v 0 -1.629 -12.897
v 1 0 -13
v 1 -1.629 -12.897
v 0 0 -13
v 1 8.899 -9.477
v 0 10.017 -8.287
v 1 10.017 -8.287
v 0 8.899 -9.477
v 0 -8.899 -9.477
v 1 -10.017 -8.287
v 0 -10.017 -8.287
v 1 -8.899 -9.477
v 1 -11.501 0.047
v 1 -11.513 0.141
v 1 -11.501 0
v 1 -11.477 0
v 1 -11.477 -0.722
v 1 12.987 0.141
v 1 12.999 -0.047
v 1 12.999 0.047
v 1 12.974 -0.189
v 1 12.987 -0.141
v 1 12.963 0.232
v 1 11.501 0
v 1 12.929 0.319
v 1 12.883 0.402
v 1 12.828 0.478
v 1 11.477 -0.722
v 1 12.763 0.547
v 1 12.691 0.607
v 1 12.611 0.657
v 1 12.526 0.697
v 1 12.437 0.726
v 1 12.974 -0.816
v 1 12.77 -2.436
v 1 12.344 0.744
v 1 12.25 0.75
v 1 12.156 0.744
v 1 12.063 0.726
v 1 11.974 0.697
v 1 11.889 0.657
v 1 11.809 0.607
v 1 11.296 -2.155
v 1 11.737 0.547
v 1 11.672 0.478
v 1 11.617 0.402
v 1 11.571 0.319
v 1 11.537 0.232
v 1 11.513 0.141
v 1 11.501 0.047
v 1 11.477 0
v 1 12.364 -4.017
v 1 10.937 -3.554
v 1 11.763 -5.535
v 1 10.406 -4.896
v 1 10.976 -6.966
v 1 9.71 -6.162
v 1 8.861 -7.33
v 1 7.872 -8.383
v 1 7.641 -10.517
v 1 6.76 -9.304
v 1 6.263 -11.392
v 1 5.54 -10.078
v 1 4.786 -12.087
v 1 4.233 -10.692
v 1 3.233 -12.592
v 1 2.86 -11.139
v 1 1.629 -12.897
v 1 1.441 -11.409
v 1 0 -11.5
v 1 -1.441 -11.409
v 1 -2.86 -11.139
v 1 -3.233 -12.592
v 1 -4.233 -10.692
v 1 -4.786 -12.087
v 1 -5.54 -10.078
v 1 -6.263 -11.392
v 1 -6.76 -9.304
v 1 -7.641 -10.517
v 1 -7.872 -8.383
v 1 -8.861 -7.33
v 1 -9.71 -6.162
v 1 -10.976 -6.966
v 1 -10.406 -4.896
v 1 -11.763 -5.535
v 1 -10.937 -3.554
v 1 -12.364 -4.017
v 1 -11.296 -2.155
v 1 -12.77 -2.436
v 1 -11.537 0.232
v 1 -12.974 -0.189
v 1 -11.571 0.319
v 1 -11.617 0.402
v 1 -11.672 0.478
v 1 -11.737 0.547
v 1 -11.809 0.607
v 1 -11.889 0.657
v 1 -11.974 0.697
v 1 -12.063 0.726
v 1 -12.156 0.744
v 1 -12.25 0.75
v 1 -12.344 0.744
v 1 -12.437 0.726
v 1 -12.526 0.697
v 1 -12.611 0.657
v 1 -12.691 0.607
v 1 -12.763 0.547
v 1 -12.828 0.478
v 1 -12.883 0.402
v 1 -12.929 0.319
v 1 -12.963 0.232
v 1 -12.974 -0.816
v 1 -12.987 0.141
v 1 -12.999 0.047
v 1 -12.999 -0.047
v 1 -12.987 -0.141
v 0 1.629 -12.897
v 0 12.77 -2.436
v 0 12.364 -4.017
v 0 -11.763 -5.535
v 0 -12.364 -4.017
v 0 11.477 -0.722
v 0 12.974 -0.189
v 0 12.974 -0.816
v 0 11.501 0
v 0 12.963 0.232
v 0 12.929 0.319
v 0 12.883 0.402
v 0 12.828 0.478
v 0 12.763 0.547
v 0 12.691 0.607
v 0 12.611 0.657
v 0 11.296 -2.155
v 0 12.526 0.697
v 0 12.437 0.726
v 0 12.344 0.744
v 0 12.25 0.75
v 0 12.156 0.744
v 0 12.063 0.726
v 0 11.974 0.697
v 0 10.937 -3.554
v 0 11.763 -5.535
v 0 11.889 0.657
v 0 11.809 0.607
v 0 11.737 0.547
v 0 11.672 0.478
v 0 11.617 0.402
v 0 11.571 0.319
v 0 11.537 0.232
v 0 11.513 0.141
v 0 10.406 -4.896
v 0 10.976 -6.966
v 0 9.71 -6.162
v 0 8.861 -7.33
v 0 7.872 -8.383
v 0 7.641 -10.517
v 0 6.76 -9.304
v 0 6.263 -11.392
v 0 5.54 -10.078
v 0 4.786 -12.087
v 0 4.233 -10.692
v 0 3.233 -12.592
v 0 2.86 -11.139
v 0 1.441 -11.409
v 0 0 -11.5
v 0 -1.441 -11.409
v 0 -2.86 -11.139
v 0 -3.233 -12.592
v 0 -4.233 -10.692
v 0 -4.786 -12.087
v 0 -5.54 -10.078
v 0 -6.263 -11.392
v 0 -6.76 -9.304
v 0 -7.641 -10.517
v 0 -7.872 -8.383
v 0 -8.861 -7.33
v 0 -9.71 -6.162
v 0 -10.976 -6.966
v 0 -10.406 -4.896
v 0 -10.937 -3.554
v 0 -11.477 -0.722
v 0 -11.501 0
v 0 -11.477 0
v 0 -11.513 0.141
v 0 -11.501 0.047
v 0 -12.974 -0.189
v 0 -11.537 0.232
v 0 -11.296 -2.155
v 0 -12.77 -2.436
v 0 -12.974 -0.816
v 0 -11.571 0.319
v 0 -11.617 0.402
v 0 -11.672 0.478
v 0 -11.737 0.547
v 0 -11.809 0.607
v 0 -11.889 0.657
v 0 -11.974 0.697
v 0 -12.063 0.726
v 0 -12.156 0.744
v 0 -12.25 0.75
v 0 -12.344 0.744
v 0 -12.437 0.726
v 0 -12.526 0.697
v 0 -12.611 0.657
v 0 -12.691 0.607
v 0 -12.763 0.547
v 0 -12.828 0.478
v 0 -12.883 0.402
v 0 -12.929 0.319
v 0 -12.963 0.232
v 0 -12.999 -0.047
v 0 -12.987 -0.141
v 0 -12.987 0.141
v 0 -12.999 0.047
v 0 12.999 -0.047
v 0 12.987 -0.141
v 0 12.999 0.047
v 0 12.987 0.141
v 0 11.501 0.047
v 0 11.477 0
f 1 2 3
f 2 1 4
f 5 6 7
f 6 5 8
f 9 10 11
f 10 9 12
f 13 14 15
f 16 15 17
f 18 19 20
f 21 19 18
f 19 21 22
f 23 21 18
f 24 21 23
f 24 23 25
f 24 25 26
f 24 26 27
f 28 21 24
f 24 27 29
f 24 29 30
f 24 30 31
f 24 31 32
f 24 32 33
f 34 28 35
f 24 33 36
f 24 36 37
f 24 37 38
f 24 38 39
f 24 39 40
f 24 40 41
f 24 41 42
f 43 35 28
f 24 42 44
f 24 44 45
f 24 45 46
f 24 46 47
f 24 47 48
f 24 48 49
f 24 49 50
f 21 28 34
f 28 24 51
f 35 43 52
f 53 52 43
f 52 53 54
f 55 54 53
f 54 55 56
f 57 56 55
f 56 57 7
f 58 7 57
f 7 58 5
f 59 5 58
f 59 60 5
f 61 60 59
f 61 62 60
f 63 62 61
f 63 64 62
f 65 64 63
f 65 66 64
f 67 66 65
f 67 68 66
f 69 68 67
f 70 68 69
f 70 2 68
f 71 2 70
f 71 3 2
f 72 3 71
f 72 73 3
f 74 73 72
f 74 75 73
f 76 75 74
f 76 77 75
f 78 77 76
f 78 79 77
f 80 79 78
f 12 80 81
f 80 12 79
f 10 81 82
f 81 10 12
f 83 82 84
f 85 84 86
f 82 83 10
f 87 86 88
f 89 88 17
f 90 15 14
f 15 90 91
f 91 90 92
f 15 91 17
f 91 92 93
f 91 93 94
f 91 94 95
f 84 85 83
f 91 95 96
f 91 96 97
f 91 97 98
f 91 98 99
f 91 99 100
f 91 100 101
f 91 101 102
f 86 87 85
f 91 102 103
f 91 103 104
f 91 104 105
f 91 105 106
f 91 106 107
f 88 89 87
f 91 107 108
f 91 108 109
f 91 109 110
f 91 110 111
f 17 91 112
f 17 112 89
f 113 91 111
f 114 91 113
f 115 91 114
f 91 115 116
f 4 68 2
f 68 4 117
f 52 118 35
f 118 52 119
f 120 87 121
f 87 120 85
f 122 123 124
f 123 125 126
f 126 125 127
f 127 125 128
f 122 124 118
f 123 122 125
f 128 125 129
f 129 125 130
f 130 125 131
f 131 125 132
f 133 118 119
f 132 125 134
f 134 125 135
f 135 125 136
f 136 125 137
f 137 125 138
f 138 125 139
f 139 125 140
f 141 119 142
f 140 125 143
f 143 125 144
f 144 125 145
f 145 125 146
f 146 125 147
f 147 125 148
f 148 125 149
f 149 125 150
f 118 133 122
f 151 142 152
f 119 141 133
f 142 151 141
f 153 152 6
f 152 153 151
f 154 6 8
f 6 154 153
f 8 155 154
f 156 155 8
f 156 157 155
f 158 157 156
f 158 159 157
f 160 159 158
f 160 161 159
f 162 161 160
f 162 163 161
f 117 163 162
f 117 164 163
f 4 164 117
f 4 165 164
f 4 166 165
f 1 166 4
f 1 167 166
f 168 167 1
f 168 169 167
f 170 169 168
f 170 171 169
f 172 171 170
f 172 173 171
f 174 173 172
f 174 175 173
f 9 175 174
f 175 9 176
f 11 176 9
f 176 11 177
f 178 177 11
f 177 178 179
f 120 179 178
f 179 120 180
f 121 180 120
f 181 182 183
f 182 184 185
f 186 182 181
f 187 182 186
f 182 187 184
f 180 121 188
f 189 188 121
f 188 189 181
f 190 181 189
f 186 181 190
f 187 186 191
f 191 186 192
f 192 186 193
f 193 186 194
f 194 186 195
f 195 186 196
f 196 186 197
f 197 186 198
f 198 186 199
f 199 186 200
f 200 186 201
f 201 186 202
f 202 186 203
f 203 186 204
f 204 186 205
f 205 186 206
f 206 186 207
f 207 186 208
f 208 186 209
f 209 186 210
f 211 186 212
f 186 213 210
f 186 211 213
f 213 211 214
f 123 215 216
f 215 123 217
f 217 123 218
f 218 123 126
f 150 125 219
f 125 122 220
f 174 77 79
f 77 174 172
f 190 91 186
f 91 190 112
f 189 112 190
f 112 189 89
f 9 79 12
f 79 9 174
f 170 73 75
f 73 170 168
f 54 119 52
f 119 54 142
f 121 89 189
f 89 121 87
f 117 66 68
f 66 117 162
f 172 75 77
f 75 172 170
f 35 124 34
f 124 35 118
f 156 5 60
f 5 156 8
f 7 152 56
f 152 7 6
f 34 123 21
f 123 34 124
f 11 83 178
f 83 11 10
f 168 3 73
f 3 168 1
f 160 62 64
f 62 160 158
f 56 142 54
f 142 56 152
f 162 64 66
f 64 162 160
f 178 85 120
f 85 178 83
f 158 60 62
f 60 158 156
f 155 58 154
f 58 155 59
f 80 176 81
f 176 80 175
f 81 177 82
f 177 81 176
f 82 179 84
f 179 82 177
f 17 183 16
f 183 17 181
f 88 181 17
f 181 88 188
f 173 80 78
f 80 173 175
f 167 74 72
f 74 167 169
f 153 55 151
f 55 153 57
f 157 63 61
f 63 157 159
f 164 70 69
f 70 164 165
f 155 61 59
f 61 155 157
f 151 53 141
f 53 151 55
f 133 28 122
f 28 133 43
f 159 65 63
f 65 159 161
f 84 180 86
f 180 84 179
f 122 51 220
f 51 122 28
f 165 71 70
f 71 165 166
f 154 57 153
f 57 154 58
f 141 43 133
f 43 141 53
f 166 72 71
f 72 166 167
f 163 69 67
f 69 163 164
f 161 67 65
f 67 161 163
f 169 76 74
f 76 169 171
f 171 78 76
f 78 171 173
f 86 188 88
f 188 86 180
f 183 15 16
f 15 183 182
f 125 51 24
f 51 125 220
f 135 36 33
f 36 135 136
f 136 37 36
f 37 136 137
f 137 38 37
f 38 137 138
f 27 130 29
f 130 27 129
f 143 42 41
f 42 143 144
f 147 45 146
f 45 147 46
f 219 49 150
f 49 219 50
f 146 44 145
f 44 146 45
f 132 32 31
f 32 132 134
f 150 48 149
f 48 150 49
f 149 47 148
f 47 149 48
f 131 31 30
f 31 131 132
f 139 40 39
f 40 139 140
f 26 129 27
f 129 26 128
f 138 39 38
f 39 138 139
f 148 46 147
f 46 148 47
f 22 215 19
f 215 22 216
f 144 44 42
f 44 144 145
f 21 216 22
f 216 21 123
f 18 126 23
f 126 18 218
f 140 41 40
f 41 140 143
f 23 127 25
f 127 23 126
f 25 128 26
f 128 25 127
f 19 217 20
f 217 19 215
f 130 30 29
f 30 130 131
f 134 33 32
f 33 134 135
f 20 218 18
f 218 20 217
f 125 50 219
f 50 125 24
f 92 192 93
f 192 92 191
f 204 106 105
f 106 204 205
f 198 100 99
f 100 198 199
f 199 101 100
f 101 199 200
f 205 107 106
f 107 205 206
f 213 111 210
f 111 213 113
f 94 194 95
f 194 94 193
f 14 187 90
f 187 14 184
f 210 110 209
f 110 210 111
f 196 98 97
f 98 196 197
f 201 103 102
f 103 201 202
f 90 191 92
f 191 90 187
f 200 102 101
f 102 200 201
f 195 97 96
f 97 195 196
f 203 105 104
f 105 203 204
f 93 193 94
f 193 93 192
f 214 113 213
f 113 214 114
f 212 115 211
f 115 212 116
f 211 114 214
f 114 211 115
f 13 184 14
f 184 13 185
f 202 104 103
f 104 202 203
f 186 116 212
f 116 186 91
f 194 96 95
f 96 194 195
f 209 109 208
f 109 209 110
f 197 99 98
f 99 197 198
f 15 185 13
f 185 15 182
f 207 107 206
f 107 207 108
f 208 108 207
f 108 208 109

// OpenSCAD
$fn = 50;
ext_diam = 26;
int_diam = 23;
sec_len = 1;

sec_thns = ext_diam - int_diam;
cen_diam = (ext_diam + int_diam) / 2;

module raw_section()
{
    difference()
    {
        difference()
        {
            cylinder(r=(ext_diam)/2, h=sec_len);
            translate([0,0,-1]) cylinder(r=(int_diam)/2, h=sec_len+2);
        }
        translate([0,-ext_diam/2,-1]) cube(size=ext_diam+1);
    }
}

module round_section()
{
    union ()
    {
        raw_section();
        translate([0, cen_diam / 2,0]) cylinder(r=sec_thns/4, h=sec_len);
        translate([0, -cen_diam / 2, 0]) cylinder(r=sec_thns/4, h=sec_len);
    }
}

mirror([0,0,1])
{
    rotate([0,90,0])
    {
        round_section();
    }
}
